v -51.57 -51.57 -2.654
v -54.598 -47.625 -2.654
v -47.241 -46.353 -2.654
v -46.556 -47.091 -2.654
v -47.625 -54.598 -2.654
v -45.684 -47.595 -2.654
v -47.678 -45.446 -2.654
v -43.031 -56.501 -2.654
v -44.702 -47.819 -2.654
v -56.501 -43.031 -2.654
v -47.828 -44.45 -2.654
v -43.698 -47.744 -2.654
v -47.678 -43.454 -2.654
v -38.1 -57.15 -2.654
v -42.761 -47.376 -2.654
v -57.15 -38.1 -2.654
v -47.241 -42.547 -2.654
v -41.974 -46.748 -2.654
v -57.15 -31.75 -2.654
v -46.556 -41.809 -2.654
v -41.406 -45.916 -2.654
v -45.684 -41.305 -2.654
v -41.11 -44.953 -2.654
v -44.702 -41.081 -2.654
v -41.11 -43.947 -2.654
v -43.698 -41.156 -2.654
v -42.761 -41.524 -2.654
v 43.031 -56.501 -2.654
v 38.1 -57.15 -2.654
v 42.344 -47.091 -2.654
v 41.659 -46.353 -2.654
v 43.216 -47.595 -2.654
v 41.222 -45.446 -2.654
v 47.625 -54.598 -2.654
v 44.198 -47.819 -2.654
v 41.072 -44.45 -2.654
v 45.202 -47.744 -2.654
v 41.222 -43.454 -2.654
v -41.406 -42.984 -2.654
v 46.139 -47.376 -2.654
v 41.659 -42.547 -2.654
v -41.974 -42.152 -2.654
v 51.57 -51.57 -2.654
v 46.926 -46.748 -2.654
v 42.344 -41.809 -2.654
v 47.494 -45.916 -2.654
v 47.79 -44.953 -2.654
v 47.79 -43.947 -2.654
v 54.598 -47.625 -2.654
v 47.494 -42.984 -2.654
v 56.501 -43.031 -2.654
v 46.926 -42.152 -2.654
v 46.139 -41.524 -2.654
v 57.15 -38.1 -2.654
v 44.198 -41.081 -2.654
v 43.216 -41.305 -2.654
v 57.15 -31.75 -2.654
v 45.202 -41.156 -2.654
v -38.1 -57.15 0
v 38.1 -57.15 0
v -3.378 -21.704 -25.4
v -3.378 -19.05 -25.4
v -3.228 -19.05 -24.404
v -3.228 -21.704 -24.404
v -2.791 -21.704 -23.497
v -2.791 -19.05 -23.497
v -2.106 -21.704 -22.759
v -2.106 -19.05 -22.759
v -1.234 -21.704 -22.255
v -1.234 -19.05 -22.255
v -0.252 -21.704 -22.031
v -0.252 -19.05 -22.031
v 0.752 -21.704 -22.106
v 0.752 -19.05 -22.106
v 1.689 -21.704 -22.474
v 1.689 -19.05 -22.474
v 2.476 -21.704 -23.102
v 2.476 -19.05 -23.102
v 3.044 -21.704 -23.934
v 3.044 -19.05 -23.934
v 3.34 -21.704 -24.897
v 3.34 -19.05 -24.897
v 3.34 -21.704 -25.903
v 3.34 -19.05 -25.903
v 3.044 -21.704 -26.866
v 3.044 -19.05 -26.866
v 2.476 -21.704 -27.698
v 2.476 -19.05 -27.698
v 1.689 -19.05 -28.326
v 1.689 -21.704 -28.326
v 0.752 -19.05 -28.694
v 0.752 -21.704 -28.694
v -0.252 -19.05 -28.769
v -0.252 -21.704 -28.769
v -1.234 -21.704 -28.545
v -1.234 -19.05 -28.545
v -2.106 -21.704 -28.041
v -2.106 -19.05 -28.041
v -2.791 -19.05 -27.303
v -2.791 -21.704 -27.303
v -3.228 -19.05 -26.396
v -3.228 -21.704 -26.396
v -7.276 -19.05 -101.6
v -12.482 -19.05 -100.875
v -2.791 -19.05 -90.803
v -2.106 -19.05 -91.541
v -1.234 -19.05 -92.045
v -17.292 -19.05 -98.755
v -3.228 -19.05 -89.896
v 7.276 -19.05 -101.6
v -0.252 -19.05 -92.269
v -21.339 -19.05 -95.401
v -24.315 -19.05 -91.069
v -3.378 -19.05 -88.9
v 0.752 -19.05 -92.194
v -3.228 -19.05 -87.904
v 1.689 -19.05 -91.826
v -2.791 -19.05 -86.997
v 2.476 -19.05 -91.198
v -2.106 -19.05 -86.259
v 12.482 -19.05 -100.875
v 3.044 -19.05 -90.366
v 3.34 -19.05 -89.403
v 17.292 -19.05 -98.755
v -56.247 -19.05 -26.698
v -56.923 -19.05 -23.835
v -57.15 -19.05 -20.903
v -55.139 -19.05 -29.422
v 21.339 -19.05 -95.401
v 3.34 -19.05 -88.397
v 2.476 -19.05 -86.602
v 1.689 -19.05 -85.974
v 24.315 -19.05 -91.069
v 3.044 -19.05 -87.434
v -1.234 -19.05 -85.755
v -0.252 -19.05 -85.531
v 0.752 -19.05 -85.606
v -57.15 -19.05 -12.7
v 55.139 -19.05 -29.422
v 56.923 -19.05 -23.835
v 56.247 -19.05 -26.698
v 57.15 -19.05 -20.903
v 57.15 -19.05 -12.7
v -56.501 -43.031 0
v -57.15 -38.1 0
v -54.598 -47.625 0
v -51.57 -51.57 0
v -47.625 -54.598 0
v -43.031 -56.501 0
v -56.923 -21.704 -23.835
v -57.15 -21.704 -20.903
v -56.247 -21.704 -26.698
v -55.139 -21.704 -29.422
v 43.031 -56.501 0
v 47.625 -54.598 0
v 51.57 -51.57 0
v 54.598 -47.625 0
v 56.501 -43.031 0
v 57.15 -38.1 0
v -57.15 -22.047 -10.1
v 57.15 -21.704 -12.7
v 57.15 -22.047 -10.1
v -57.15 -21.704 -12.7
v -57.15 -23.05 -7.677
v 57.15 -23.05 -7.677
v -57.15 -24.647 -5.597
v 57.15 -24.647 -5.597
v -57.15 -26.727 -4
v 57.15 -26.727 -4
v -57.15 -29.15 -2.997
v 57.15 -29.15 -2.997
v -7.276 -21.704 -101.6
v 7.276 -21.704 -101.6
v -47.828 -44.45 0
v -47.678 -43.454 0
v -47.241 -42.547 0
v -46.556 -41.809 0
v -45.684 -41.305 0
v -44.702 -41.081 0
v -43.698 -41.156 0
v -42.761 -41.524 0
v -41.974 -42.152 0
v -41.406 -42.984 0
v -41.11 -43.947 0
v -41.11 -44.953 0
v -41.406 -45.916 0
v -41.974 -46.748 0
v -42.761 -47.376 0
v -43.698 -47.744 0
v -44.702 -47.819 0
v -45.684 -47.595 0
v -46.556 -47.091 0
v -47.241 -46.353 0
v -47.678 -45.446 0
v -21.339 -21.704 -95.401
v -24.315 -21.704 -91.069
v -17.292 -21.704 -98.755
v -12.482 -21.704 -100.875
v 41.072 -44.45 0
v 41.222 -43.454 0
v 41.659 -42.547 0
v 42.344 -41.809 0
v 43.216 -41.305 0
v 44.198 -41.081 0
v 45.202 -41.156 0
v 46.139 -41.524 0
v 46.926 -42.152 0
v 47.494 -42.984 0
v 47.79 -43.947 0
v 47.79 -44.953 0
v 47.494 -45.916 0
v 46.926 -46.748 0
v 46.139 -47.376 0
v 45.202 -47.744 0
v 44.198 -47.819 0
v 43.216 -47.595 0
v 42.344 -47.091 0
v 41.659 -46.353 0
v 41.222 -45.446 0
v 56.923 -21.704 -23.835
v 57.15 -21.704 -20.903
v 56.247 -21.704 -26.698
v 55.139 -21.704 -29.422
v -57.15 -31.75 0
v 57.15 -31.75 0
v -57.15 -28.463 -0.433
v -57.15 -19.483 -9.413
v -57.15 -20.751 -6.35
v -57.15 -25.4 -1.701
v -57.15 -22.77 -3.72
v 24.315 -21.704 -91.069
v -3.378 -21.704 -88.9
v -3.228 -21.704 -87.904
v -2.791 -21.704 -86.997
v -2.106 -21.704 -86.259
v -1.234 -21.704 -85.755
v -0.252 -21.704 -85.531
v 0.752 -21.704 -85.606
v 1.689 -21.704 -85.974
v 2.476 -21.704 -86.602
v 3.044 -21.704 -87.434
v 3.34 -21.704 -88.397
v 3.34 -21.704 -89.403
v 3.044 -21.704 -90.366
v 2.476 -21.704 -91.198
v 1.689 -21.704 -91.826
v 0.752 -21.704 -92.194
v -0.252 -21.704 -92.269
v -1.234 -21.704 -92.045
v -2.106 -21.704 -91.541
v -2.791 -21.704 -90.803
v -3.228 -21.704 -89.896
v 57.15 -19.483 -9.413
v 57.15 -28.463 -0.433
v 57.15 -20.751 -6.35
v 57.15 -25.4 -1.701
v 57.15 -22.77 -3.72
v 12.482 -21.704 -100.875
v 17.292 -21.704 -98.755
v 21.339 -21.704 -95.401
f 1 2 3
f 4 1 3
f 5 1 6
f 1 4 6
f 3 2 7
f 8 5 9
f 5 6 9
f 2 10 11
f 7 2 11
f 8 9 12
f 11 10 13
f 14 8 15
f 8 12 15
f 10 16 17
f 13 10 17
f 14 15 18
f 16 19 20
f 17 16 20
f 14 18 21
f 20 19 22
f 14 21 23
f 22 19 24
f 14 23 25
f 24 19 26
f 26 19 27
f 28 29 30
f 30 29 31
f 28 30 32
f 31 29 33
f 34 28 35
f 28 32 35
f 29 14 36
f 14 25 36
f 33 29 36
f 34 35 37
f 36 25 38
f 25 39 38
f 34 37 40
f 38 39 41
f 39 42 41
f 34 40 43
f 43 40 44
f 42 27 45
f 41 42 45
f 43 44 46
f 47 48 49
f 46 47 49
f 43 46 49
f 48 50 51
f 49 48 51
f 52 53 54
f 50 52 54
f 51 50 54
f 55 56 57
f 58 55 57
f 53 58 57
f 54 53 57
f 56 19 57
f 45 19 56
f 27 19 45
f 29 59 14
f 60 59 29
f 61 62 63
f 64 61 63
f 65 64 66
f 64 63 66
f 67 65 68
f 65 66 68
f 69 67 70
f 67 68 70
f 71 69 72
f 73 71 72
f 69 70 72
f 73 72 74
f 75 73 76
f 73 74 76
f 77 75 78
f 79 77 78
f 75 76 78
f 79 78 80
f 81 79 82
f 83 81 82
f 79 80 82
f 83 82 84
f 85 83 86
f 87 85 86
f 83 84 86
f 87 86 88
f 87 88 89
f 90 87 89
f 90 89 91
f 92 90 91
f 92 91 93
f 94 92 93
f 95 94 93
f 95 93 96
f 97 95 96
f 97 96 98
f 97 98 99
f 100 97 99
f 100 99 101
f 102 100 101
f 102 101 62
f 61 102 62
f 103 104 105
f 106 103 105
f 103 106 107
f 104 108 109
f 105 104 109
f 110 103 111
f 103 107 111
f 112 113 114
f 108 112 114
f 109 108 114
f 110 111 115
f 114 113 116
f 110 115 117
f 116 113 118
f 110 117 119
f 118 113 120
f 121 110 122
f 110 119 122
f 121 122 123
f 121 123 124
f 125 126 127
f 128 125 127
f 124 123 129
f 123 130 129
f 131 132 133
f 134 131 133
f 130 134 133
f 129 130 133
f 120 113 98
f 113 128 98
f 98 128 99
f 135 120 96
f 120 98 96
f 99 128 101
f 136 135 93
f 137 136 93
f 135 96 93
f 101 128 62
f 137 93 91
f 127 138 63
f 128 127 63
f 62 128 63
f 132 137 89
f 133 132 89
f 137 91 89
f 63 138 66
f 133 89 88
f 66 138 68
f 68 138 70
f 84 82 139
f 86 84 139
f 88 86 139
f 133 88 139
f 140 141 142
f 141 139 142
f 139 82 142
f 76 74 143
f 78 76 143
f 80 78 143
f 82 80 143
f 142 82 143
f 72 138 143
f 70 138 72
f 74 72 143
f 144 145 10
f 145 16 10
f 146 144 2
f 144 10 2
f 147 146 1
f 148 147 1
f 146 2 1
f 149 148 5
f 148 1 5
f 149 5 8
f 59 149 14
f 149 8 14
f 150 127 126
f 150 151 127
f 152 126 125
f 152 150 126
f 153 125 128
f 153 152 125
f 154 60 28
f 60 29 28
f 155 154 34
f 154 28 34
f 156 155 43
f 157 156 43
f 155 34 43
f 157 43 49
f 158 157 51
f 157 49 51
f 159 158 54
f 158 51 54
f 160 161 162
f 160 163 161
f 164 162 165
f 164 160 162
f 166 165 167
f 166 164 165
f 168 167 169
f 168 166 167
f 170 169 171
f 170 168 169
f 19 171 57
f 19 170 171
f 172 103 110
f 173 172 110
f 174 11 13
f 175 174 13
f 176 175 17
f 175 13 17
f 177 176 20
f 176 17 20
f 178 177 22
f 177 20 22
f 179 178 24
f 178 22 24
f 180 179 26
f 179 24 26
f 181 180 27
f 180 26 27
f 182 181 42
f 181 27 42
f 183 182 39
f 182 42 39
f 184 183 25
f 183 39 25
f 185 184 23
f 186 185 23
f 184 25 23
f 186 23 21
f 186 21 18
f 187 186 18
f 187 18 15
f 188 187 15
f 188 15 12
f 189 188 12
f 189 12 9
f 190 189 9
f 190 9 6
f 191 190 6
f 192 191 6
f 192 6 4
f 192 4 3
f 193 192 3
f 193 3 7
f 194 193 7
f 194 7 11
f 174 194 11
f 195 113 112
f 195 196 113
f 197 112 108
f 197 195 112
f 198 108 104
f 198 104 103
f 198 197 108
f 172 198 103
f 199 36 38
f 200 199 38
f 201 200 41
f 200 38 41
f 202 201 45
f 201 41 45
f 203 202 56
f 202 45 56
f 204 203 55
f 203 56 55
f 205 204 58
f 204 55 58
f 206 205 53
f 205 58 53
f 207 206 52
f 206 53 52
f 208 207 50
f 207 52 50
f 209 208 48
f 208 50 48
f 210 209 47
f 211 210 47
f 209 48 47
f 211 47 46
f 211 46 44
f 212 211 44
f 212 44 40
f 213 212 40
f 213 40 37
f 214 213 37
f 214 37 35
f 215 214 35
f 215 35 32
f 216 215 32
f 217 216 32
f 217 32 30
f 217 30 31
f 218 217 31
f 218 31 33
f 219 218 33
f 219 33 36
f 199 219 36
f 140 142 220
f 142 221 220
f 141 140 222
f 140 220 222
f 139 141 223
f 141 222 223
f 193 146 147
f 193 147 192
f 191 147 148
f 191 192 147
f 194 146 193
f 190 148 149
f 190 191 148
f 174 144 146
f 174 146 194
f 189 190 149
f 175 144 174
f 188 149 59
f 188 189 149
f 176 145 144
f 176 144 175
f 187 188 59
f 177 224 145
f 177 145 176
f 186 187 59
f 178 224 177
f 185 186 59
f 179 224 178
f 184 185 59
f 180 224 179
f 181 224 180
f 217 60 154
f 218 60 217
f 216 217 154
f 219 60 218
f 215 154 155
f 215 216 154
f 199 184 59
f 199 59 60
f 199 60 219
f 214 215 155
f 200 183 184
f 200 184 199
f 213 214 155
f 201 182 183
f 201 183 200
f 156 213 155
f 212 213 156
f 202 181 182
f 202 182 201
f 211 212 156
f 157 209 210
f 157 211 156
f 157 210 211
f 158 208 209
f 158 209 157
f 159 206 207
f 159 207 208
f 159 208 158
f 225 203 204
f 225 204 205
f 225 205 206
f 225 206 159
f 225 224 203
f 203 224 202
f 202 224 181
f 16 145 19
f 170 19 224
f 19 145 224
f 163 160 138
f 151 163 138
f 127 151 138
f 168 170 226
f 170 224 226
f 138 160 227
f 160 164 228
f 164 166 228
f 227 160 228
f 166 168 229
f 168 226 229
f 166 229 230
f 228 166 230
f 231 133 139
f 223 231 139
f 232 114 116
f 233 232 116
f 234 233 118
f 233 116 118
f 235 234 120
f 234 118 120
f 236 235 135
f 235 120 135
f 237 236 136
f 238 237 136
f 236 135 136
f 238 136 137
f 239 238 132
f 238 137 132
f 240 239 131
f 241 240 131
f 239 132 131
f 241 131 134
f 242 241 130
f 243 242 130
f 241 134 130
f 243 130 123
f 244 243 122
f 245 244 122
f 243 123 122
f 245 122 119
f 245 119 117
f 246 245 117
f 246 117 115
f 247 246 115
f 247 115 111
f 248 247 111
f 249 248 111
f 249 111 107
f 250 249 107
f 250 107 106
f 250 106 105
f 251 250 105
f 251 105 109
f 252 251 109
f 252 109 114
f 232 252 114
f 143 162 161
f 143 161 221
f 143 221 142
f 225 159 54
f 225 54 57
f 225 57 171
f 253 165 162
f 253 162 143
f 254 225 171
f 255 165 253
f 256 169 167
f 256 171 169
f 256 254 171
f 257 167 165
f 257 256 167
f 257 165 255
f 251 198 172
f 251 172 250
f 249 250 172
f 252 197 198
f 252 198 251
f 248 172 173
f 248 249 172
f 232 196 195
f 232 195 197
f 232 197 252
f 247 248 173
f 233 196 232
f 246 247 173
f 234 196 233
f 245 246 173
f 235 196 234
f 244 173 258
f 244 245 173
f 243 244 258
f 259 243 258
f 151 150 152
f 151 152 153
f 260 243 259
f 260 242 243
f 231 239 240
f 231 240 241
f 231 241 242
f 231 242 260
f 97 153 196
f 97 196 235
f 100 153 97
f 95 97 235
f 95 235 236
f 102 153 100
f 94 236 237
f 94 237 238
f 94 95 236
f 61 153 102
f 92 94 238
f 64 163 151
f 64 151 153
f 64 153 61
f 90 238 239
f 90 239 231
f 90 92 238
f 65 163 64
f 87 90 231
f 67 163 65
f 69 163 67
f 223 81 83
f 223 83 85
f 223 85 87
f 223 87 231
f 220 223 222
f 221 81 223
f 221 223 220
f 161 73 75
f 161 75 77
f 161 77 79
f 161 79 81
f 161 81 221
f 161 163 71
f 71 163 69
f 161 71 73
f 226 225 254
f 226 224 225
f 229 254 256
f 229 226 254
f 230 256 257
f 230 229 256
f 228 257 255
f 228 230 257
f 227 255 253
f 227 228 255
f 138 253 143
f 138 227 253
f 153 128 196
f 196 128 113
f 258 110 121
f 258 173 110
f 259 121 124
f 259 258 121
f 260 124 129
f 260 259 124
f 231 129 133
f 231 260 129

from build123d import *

# Parameters (mm, degrees)
F3_DEPTH = 2.6543
F4_W     = 114.3
F4_H     = 38.1
F5_DEPTH = 2.6543
F6_R     = 10.0457
F7_R     = 12.7
F8_R     = 19.05
F10_D    = 6.7564
F12_D    = 6.7564


with BuildPart() as f3:
    # F2 (on offset) → F3 (new body)
    with BuildSketch(Plane.XZ.offset(19.05)):
        Polygon((57.15, 0), (0, 0), (-57.15, 0), (-57.15, -25.4), (-19.05, -101.6), (0, -101.6), (19.05, -101.6), (57.15, -25.4), align=None)
    extrude(amount=F3_DEPTH)

    # F4 (on face) → F5 (join)
    with BuildSketch(Plane.XY):
        with Locations((0, -38.1)):
            Rectangle(F4_W, F4_H)
    extrude(amount=-F5_DEPTH)

    # F6
    f6_edges = [f3.edges().sort_by_distance(p)[0] for p in [
        (0, -21.7043, -2.6543),
    ]]
    fillet(f6_edges, radius=F6_R)

    # F7
    f7_edges = [f3.edges().sort_by_distance(p)[0] for p in [
        (0, -19.05, 0),
    ]]
    fillet(f7_edges, radius=F7_R)

    # F8
    f8_edges = [f3.edges().sort_by_distance(p)[0] for p in [
        (-57.15, -57.15, -1.32715),
        (57.15, -57.15, -1.32715),
        (-57.15, -20.37715, -25.4),
        (57.15, -20.37715, -25.4),
        (19.05, -20.37715, -101.6),
        (-19.05, -20.37715, -101.6),
    ]]
    fillet(f8_edges, radius=F8_R)

    # F10 (through all)
    with Locations(Plane.XY):
        with Locations((-44.45, -44.45), (44.45, -44.45)):
            Hole(F10_D / 2)

    # F12 (through all)
    with Locations(Plane.XZ.offset(21.7043)):
        with Locations((0, -25.4), (0, -88.9)):
            Hole(F12_D / 2)


solid = f3.part
